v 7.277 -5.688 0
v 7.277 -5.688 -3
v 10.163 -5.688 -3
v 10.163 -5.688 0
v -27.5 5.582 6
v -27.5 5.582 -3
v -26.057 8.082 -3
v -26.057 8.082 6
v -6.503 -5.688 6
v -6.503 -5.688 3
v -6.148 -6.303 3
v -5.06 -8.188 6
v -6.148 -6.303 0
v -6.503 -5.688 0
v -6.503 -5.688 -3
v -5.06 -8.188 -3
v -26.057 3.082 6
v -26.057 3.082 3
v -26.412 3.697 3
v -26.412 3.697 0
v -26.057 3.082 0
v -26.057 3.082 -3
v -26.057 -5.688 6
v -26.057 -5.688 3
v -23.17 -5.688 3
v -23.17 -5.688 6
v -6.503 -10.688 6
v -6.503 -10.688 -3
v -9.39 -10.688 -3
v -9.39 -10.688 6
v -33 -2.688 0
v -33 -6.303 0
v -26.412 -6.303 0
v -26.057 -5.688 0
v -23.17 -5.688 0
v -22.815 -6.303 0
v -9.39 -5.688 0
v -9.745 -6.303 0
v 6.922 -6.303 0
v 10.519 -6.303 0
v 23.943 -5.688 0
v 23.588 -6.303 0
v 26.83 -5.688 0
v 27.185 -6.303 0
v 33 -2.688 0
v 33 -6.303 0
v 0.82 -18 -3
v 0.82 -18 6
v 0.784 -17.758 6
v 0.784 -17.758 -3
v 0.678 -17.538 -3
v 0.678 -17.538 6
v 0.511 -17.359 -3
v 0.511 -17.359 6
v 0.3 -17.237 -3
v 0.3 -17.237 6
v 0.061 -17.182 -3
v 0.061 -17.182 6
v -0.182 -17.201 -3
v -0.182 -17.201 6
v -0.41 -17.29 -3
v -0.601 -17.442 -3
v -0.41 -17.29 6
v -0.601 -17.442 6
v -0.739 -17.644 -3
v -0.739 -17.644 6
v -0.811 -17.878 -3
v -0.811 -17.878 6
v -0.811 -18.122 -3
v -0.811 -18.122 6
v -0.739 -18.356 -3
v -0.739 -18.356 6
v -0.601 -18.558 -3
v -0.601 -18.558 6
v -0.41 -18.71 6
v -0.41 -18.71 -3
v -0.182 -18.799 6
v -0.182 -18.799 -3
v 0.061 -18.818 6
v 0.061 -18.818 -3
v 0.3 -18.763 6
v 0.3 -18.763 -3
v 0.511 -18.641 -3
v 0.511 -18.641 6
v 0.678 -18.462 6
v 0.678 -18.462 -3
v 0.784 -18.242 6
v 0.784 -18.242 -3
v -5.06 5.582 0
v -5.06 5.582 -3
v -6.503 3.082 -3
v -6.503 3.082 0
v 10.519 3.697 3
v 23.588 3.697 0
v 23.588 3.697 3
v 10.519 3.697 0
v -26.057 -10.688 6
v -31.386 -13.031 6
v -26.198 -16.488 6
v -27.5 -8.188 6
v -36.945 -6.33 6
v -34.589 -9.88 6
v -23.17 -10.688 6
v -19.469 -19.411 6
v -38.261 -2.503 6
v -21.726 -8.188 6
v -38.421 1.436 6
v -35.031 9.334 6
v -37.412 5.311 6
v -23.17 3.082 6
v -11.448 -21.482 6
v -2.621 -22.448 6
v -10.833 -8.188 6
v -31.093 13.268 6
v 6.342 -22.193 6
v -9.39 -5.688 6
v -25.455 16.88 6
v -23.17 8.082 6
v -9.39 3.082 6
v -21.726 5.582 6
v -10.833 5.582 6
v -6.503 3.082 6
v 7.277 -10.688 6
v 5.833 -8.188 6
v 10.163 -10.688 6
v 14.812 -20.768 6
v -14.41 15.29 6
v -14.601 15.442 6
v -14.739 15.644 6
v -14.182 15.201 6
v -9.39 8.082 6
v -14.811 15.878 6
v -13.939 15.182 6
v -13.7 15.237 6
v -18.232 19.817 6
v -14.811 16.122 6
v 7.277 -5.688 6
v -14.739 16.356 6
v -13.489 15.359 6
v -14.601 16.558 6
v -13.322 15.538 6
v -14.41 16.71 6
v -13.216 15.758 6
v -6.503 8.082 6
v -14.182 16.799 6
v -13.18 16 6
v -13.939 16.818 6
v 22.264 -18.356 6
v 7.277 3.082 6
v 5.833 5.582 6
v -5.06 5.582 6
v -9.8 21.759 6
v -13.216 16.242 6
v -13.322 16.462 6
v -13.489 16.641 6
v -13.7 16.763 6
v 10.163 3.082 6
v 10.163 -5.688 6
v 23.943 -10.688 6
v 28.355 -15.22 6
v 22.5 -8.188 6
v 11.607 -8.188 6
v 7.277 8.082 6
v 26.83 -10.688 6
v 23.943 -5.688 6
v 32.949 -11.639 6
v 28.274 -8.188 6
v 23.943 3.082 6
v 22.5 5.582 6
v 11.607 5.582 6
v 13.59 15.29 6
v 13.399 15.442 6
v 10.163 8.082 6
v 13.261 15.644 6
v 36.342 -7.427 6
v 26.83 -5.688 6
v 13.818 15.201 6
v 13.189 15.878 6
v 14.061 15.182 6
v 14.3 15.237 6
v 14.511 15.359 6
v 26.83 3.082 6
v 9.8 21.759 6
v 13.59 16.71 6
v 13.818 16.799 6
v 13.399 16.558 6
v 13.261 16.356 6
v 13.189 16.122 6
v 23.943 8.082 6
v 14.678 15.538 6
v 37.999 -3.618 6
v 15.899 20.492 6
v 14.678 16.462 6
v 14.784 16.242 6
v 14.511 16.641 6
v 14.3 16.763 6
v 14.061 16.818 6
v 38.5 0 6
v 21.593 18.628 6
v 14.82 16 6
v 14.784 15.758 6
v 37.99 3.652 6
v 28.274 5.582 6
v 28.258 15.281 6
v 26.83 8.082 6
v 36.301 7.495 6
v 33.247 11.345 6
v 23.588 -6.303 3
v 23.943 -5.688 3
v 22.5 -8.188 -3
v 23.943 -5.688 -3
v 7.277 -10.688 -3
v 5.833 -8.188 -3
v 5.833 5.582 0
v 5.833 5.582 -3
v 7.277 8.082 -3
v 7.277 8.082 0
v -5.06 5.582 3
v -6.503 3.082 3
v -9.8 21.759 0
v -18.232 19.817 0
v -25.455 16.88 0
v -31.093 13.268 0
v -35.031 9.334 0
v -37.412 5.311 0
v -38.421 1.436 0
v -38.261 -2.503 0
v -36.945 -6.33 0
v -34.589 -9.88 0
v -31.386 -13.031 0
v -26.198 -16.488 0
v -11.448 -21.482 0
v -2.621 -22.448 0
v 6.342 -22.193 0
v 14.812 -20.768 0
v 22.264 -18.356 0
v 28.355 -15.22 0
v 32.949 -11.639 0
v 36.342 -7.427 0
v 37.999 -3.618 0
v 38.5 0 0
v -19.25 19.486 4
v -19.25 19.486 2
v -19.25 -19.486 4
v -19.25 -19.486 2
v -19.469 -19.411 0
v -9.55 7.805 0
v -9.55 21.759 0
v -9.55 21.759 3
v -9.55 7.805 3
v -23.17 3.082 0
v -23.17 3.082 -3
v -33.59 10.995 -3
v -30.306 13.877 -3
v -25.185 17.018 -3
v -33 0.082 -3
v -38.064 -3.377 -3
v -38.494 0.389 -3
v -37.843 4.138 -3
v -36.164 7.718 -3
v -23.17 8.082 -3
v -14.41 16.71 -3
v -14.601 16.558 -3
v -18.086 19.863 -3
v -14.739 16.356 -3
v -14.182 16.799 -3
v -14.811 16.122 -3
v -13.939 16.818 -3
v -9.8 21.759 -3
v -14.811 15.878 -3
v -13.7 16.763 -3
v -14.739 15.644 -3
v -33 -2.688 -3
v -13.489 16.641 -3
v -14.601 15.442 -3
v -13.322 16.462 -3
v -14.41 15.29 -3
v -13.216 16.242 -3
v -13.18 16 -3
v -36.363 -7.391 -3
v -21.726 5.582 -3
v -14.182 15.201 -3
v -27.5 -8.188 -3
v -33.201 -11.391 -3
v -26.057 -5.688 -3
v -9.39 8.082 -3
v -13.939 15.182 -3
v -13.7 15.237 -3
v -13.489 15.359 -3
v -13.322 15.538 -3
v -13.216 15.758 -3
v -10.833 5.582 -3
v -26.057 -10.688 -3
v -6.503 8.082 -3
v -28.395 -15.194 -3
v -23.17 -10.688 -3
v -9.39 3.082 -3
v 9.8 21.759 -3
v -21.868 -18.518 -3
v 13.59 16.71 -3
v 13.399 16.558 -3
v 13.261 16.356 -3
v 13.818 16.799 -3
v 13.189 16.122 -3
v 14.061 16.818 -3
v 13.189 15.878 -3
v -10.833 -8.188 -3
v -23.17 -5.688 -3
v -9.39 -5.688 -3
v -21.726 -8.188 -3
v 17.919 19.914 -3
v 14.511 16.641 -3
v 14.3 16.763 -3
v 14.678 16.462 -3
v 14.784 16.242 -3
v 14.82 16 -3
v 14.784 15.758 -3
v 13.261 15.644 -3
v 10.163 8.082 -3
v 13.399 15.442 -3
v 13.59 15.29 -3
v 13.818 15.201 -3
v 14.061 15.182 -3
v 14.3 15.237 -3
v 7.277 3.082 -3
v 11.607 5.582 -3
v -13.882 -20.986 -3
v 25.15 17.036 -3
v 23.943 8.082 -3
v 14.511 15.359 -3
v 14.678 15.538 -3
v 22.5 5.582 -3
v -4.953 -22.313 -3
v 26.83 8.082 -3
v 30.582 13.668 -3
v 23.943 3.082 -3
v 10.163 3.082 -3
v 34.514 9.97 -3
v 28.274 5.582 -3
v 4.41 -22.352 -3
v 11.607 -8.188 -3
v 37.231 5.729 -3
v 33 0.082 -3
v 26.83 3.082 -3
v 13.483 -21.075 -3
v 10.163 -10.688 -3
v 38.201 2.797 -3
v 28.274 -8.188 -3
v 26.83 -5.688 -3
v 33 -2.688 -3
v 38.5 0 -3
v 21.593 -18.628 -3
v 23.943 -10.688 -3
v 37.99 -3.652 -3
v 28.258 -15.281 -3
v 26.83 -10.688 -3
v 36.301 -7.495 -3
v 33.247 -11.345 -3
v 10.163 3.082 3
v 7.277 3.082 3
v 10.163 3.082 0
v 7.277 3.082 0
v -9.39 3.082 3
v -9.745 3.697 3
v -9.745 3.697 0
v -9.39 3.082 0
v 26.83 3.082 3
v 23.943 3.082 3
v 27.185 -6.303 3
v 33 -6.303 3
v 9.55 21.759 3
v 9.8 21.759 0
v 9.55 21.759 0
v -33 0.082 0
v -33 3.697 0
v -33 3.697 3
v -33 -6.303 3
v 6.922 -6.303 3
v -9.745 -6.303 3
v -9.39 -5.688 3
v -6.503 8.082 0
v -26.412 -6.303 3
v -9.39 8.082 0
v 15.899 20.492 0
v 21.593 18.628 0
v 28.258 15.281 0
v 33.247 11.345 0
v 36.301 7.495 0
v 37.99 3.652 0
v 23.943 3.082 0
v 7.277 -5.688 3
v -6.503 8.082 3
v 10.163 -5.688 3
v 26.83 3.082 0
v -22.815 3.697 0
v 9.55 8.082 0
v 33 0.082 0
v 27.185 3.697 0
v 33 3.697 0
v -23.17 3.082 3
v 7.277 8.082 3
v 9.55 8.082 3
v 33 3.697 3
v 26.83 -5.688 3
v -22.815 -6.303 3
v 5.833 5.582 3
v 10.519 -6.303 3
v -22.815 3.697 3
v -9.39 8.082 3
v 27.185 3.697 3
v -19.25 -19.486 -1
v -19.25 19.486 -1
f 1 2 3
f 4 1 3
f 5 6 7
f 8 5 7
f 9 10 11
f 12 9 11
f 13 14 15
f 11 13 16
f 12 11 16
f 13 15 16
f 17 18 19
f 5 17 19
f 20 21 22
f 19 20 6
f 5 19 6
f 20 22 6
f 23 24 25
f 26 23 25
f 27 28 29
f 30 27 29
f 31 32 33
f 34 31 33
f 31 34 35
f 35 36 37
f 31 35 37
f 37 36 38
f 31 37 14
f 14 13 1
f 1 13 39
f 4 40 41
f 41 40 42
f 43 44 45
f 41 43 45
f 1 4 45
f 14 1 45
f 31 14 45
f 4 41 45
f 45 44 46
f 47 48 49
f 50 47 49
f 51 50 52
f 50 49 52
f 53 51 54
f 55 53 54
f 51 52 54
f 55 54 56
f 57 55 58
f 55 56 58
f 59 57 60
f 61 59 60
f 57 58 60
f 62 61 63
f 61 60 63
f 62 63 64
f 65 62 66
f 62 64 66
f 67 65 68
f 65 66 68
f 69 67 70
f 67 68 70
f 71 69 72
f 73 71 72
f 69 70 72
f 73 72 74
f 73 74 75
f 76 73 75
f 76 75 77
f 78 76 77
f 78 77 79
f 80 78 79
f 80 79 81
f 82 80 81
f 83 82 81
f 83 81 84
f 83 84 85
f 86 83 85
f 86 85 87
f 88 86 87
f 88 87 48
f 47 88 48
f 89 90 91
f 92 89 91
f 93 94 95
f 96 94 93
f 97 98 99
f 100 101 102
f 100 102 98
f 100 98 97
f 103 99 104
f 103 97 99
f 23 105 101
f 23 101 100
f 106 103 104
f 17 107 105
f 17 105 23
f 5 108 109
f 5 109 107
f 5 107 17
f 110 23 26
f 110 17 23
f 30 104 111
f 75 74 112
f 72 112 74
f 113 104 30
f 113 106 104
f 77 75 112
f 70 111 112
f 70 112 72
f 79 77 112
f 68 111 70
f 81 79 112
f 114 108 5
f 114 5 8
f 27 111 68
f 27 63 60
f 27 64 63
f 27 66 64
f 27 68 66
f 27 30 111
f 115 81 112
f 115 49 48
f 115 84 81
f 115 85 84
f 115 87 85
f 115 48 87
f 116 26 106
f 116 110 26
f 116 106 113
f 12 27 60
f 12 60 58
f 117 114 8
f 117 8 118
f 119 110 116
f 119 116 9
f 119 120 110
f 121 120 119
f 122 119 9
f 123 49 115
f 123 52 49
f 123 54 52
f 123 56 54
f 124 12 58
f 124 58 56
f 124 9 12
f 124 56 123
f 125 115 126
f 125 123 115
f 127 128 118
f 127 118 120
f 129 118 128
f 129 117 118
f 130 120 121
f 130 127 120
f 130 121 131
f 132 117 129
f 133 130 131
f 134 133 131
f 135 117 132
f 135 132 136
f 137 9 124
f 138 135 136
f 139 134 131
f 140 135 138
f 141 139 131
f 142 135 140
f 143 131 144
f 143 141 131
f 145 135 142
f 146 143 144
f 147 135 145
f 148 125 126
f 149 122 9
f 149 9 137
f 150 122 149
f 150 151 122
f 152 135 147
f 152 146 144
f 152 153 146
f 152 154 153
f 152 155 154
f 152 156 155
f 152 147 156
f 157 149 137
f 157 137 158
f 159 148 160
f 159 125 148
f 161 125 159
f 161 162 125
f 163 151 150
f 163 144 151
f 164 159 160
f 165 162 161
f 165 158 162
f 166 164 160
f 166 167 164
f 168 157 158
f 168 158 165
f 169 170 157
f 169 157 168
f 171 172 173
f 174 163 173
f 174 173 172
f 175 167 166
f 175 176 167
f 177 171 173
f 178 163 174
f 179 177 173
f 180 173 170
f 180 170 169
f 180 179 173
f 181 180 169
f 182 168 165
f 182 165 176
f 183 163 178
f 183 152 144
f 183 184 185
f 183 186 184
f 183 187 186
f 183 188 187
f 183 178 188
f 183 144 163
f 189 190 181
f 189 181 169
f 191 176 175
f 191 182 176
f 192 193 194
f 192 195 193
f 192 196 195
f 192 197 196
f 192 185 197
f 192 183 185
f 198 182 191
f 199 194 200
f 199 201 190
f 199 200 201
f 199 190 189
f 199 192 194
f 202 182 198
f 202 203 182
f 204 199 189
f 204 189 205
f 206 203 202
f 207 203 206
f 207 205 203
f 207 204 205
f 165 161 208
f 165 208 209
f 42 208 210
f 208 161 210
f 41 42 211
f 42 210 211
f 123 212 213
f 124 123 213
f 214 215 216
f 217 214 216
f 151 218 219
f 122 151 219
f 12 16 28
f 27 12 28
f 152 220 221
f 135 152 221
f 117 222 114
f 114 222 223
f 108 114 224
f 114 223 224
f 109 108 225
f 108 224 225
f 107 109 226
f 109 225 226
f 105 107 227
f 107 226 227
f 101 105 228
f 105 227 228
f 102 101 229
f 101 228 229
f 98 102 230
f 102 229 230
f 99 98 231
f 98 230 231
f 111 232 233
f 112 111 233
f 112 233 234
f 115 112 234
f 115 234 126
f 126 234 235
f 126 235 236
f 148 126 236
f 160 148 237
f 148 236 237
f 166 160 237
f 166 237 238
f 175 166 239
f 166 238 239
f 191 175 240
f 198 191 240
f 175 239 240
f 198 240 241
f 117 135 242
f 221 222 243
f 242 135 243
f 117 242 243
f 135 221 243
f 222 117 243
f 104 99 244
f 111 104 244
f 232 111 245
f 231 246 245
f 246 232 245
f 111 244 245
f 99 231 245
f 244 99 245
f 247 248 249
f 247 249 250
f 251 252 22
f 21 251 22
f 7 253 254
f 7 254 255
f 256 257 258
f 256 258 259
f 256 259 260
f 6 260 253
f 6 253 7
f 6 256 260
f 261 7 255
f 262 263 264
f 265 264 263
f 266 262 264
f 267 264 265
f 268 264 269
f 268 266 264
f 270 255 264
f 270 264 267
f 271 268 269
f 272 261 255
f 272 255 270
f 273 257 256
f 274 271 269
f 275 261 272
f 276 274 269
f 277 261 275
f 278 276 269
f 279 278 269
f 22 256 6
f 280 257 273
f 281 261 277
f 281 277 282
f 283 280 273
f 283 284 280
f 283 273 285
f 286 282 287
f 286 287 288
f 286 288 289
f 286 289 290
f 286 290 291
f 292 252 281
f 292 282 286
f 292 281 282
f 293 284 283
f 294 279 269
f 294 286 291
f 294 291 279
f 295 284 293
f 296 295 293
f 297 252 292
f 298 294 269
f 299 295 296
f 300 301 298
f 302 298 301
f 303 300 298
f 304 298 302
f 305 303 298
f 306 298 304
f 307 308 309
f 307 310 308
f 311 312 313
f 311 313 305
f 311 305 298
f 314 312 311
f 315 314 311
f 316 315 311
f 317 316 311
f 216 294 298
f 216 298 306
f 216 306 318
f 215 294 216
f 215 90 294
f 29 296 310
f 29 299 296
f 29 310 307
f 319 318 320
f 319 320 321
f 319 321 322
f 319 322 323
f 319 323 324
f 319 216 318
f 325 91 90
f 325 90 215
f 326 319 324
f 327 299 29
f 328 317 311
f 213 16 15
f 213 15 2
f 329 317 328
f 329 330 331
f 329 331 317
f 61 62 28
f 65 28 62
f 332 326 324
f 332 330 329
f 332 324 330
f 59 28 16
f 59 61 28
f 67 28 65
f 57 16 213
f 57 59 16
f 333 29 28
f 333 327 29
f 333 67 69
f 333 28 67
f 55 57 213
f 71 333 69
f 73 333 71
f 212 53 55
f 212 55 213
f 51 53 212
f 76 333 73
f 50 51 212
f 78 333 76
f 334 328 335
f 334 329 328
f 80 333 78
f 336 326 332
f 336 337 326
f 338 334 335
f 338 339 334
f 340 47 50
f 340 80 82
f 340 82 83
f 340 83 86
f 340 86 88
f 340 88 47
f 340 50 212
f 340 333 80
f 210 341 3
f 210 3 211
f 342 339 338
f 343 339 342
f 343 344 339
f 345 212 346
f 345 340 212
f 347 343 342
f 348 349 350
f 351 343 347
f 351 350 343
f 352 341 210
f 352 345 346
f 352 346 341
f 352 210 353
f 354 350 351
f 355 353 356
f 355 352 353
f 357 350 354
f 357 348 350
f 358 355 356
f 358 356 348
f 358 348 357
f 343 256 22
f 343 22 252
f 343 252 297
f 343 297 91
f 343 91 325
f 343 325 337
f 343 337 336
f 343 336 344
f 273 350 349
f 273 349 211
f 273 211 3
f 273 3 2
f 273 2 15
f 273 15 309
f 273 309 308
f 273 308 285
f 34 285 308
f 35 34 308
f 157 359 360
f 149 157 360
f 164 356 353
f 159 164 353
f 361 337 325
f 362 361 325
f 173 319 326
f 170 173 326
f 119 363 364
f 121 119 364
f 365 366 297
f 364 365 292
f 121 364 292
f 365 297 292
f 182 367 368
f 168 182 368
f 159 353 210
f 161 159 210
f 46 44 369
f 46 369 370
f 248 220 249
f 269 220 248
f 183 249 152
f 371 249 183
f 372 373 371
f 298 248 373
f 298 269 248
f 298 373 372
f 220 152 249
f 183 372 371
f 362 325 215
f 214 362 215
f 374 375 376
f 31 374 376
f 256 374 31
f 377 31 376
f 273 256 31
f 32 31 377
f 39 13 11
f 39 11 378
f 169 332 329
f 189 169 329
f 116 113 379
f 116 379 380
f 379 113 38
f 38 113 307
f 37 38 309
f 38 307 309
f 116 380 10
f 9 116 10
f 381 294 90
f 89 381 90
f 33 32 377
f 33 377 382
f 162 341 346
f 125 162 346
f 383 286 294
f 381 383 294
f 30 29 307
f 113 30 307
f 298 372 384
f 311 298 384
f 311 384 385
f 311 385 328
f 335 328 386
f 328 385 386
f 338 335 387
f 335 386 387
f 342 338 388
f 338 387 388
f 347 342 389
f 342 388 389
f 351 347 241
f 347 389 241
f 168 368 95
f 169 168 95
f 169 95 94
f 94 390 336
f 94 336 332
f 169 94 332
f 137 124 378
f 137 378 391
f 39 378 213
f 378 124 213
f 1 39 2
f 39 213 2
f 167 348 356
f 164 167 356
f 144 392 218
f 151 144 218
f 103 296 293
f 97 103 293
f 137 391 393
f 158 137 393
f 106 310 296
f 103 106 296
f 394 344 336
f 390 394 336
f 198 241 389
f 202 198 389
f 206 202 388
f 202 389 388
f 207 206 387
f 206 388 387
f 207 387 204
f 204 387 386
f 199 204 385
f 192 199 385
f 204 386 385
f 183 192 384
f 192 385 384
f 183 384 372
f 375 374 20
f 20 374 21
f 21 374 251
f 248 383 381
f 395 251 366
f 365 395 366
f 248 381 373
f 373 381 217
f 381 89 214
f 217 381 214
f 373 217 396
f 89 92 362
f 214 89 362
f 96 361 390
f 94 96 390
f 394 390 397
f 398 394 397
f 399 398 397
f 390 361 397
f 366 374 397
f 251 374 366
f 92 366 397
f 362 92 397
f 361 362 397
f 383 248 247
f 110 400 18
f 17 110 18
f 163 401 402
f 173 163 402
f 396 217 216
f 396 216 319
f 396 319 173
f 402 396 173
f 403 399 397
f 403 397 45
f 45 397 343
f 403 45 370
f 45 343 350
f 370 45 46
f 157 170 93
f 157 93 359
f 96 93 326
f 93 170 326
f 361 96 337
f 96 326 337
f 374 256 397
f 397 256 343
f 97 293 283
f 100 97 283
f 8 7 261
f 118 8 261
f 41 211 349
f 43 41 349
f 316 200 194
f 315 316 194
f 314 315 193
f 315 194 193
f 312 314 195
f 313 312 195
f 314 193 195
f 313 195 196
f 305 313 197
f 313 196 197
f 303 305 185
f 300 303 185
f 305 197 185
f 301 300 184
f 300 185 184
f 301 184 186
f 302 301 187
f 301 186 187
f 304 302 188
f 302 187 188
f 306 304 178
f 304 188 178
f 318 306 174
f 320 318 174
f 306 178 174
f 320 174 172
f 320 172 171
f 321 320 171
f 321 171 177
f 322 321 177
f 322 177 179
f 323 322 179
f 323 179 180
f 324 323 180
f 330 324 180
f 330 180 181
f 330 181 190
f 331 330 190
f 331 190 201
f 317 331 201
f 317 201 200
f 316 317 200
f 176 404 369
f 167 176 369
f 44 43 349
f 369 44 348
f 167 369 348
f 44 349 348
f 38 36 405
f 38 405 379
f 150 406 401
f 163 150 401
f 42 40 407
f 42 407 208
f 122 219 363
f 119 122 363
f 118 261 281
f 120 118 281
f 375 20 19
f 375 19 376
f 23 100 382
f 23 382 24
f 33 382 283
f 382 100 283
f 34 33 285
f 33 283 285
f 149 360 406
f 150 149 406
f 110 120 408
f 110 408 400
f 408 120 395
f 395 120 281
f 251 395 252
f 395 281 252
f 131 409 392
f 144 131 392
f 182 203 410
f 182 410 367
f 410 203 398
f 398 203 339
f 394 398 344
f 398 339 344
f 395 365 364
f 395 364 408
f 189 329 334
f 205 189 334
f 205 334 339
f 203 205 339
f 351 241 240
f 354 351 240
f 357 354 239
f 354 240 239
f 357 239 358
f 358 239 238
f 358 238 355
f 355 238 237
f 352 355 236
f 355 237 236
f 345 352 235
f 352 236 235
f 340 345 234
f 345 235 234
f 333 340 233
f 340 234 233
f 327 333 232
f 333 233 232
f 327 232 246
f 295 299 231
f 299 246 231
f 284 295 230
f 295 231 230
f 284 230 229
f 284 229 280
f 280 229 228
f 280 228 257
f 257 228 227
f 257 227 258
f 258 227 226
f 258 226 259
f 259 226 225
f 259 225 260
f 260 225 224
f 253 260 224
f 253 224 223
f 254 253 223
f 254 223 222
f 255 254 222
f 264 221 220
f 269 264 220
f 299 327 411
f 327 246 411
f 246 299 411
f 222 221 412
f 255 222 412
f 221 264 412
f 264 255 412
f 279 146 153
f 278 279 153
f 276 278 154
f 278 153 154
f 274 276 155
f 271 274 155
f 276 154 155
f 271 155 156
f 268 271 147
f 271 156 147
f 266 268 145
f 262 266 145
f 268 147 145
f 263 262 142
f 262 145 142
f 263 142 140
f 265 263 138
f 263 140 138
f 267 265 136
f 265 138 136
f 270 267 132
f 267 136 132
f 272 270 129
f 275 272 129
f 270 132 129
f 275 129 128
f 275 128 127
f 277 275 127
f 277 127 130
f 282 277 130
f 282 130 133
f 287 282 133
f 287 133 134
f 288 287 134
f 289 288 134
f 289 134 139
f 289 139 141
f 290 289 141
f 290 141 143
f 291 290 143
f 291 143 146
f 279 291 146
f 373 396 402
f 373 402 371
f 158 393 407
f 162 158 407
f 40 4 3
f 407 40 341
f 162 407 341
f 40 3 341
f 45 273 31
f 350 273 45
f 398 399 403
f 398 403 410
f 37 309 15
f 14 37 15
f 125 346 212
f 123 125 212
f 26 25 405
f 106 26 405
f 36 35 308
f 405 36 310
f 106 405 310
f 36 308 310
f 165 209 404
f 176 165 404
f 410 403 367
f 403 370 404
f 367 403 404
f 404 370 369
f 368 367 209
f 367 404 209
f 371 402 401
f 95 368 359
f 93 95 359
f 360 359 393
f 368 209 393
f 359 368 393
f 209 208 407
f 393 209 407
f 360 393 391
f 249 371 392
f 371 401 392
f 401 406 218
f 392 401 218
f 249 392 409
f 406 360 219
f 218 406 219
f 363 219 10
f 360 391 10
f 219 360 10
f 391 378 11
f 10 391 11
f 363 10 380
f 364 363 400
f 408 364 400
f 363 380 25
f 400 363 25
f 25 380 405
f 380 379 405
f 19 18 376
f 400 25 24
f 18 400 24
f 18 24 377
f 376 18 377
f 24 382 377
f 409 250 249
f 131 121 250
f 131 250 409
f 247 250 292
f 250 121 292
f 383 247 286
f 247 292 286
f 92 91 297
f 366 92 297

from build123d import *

# Parameters (mm, degrees)
PAD_DEPTH           = 6
POCKET_DEPTH        = 3
PAD001_DEPTH        = 3
SKETCH003_W         = 66
SKETCH003_H         = 2.77
POCKET001_DEPTH     = 3
SKETCH004_W         = 19.6
SKETCH004_H         = 1
POCKET002_DEPTH     = 9.001
SKETCH005_R         = 0.82
POCKET003_DEPTH     = 9.001
POCKET004_DEPTH     = 9.001
LINEARPATTERN_COUNT = 4
LINEARPATTERN_PITCH = 16.666667


with BuildPart() as part:
    # Sketch → Pad (new body)
    with BuildSketch(Plane.XY):
        with BuildLine():
            add(Edge.make_bspline(
                [(38.5, 0), (38.5, 38.971143), (-19.25, 19.485572), (-77, 0), (-19.25, -19.485572), (38.5, -38.971143), (38.5, 0)],
                knots=[0, 0, 0, 2.094395, 2.094395, 4.18879, 4.18879, 6.283185, 6.283185, 6.283185], degree=2, weights=[1, 0.5, 1, 0.5, 1, 0.5, 1]))
        make_face()
    extrude(amount=PAD_DEPTH)

    # Sketch001 (on Face2 of Pad) → Pocket (cut)
    with BuildSketch(Plane(origin=(0, 0, 0), x_dir=(1, 0, 0), z_dir=(0, 0, -1))):
        Polygon((9.55, -3.696801), (9.55, -21.796801), (-9.55, -21.796801), (-9.55, -3.696801), (-33, -3.696801), (-33, 6.303199), (33, 6.303199), (33, -3.696801), align=None)
    extrude(amount=-POCKET_DEPTH, mode=Mode.SUBTRACT)

    # Sketch002 (on Face2 of Pocket) → Pad001 (join)
    with BuildSketch(Plane(origin=(0, 0, 0), x_dir=(1, 0, 0), z_dir=(0, 0, -1))):
        with BuildLine():
            add(Edge.make_bspline(
                [(38.5, 0), (38.5, 38.971143), (-19.25, 19.485572), (-77, 0), (-19.25, -19.485572), (38.5, -38.971143), (38.5, 0)],
                knots=[0, 0, 0, 2.094395, 2.094395, 4.18879, 4.18879, 6.283185, 6.283185, 6.283185], degree=2, weights=[1, 0.5, 1, 0.5, 1, 0.5, 1]))
        make_face()
    extrude(amount=PAD001_DEPTH)

    # Sketch003 (on Face4 of Pad001) → Pocket001 (cut)
    with BuildSketch(Plane(origin=(0, 0, -3), x_dir=(1, 0, 0), z_dir=(0, 0, -1))):
        with Locations((0, 1.303199)):
            Rectangle(SKETCH003_W, SKETCH003_H)
    extrude(amount=-POCKET001_DEPTH, mode=Mode.SUBTRACT)

    # Sketch004 (on Face4 of Pocket001) → Pocket002 (cut, through all)
    with BuildSketch(Plane(origin=(0, 0, -3), x_dir=(1, 0, 0), z_dir=(0, 0, -1))):
        with Locations((0, -22.258868)):
            Rectangle(SKETCH004_W, SKETCH004_H)
    extrude(amount=-POCKET002_DEPTH, mode=Mode.SUBTRACT)

    # Sketch005 (on Face4 of Pocket002) → Pocket003 (cut, through all)
    with BuildSketch(Plane.XY.offset(6)):
        with Locations((-14, 16)):
            Circle(SKETCH005_R)
        with Locations((14, 16)):
            Circle(SKETCH005_R)
        with Locations((0, -18)):
            Circle(SKETCH005_R)
    extrude(amount=-POCKET003_DEPTH, mode=Mode.SUBTRACT)

    # Sketch006 (on Face7 of Pocket003) → Pocket004 (cut, through all)
    with BuildSketch(Plane(origin=(0, 0, -3), x_dir=(1, 0, 0), z_dir=(0, 0, -1))):
        Polygon((-21.726497, -5.581801), (-23.169873, -3.081801), (-26.056624, -3.081801), (-27.5, -5.581801), (-26.056624, -8.081801), (-23.169873, -8.081801), align=None)
        Polygon((-23.169873, 5.688199), (-21.726497, 8.188199), (-23.169873, 10.688199), (-26.056624, 10.688199), (-27.5, 8.188199), (-26.056624, 5.688199), align=None)
    pocket004 = extrude(amount=-POCKET004_DEPTH, mode=Mode.SUBTRACT)

    # LinearPattern: Pocket004 ×4
    with Locations(*[(i * LINEARPATTERN_PITCH, 0, 0) for i in range(1, LINEARPATTERN_COUNT)]):
        add(pocket004, mode=Mode.SUBTRACT)


solid = part.part
